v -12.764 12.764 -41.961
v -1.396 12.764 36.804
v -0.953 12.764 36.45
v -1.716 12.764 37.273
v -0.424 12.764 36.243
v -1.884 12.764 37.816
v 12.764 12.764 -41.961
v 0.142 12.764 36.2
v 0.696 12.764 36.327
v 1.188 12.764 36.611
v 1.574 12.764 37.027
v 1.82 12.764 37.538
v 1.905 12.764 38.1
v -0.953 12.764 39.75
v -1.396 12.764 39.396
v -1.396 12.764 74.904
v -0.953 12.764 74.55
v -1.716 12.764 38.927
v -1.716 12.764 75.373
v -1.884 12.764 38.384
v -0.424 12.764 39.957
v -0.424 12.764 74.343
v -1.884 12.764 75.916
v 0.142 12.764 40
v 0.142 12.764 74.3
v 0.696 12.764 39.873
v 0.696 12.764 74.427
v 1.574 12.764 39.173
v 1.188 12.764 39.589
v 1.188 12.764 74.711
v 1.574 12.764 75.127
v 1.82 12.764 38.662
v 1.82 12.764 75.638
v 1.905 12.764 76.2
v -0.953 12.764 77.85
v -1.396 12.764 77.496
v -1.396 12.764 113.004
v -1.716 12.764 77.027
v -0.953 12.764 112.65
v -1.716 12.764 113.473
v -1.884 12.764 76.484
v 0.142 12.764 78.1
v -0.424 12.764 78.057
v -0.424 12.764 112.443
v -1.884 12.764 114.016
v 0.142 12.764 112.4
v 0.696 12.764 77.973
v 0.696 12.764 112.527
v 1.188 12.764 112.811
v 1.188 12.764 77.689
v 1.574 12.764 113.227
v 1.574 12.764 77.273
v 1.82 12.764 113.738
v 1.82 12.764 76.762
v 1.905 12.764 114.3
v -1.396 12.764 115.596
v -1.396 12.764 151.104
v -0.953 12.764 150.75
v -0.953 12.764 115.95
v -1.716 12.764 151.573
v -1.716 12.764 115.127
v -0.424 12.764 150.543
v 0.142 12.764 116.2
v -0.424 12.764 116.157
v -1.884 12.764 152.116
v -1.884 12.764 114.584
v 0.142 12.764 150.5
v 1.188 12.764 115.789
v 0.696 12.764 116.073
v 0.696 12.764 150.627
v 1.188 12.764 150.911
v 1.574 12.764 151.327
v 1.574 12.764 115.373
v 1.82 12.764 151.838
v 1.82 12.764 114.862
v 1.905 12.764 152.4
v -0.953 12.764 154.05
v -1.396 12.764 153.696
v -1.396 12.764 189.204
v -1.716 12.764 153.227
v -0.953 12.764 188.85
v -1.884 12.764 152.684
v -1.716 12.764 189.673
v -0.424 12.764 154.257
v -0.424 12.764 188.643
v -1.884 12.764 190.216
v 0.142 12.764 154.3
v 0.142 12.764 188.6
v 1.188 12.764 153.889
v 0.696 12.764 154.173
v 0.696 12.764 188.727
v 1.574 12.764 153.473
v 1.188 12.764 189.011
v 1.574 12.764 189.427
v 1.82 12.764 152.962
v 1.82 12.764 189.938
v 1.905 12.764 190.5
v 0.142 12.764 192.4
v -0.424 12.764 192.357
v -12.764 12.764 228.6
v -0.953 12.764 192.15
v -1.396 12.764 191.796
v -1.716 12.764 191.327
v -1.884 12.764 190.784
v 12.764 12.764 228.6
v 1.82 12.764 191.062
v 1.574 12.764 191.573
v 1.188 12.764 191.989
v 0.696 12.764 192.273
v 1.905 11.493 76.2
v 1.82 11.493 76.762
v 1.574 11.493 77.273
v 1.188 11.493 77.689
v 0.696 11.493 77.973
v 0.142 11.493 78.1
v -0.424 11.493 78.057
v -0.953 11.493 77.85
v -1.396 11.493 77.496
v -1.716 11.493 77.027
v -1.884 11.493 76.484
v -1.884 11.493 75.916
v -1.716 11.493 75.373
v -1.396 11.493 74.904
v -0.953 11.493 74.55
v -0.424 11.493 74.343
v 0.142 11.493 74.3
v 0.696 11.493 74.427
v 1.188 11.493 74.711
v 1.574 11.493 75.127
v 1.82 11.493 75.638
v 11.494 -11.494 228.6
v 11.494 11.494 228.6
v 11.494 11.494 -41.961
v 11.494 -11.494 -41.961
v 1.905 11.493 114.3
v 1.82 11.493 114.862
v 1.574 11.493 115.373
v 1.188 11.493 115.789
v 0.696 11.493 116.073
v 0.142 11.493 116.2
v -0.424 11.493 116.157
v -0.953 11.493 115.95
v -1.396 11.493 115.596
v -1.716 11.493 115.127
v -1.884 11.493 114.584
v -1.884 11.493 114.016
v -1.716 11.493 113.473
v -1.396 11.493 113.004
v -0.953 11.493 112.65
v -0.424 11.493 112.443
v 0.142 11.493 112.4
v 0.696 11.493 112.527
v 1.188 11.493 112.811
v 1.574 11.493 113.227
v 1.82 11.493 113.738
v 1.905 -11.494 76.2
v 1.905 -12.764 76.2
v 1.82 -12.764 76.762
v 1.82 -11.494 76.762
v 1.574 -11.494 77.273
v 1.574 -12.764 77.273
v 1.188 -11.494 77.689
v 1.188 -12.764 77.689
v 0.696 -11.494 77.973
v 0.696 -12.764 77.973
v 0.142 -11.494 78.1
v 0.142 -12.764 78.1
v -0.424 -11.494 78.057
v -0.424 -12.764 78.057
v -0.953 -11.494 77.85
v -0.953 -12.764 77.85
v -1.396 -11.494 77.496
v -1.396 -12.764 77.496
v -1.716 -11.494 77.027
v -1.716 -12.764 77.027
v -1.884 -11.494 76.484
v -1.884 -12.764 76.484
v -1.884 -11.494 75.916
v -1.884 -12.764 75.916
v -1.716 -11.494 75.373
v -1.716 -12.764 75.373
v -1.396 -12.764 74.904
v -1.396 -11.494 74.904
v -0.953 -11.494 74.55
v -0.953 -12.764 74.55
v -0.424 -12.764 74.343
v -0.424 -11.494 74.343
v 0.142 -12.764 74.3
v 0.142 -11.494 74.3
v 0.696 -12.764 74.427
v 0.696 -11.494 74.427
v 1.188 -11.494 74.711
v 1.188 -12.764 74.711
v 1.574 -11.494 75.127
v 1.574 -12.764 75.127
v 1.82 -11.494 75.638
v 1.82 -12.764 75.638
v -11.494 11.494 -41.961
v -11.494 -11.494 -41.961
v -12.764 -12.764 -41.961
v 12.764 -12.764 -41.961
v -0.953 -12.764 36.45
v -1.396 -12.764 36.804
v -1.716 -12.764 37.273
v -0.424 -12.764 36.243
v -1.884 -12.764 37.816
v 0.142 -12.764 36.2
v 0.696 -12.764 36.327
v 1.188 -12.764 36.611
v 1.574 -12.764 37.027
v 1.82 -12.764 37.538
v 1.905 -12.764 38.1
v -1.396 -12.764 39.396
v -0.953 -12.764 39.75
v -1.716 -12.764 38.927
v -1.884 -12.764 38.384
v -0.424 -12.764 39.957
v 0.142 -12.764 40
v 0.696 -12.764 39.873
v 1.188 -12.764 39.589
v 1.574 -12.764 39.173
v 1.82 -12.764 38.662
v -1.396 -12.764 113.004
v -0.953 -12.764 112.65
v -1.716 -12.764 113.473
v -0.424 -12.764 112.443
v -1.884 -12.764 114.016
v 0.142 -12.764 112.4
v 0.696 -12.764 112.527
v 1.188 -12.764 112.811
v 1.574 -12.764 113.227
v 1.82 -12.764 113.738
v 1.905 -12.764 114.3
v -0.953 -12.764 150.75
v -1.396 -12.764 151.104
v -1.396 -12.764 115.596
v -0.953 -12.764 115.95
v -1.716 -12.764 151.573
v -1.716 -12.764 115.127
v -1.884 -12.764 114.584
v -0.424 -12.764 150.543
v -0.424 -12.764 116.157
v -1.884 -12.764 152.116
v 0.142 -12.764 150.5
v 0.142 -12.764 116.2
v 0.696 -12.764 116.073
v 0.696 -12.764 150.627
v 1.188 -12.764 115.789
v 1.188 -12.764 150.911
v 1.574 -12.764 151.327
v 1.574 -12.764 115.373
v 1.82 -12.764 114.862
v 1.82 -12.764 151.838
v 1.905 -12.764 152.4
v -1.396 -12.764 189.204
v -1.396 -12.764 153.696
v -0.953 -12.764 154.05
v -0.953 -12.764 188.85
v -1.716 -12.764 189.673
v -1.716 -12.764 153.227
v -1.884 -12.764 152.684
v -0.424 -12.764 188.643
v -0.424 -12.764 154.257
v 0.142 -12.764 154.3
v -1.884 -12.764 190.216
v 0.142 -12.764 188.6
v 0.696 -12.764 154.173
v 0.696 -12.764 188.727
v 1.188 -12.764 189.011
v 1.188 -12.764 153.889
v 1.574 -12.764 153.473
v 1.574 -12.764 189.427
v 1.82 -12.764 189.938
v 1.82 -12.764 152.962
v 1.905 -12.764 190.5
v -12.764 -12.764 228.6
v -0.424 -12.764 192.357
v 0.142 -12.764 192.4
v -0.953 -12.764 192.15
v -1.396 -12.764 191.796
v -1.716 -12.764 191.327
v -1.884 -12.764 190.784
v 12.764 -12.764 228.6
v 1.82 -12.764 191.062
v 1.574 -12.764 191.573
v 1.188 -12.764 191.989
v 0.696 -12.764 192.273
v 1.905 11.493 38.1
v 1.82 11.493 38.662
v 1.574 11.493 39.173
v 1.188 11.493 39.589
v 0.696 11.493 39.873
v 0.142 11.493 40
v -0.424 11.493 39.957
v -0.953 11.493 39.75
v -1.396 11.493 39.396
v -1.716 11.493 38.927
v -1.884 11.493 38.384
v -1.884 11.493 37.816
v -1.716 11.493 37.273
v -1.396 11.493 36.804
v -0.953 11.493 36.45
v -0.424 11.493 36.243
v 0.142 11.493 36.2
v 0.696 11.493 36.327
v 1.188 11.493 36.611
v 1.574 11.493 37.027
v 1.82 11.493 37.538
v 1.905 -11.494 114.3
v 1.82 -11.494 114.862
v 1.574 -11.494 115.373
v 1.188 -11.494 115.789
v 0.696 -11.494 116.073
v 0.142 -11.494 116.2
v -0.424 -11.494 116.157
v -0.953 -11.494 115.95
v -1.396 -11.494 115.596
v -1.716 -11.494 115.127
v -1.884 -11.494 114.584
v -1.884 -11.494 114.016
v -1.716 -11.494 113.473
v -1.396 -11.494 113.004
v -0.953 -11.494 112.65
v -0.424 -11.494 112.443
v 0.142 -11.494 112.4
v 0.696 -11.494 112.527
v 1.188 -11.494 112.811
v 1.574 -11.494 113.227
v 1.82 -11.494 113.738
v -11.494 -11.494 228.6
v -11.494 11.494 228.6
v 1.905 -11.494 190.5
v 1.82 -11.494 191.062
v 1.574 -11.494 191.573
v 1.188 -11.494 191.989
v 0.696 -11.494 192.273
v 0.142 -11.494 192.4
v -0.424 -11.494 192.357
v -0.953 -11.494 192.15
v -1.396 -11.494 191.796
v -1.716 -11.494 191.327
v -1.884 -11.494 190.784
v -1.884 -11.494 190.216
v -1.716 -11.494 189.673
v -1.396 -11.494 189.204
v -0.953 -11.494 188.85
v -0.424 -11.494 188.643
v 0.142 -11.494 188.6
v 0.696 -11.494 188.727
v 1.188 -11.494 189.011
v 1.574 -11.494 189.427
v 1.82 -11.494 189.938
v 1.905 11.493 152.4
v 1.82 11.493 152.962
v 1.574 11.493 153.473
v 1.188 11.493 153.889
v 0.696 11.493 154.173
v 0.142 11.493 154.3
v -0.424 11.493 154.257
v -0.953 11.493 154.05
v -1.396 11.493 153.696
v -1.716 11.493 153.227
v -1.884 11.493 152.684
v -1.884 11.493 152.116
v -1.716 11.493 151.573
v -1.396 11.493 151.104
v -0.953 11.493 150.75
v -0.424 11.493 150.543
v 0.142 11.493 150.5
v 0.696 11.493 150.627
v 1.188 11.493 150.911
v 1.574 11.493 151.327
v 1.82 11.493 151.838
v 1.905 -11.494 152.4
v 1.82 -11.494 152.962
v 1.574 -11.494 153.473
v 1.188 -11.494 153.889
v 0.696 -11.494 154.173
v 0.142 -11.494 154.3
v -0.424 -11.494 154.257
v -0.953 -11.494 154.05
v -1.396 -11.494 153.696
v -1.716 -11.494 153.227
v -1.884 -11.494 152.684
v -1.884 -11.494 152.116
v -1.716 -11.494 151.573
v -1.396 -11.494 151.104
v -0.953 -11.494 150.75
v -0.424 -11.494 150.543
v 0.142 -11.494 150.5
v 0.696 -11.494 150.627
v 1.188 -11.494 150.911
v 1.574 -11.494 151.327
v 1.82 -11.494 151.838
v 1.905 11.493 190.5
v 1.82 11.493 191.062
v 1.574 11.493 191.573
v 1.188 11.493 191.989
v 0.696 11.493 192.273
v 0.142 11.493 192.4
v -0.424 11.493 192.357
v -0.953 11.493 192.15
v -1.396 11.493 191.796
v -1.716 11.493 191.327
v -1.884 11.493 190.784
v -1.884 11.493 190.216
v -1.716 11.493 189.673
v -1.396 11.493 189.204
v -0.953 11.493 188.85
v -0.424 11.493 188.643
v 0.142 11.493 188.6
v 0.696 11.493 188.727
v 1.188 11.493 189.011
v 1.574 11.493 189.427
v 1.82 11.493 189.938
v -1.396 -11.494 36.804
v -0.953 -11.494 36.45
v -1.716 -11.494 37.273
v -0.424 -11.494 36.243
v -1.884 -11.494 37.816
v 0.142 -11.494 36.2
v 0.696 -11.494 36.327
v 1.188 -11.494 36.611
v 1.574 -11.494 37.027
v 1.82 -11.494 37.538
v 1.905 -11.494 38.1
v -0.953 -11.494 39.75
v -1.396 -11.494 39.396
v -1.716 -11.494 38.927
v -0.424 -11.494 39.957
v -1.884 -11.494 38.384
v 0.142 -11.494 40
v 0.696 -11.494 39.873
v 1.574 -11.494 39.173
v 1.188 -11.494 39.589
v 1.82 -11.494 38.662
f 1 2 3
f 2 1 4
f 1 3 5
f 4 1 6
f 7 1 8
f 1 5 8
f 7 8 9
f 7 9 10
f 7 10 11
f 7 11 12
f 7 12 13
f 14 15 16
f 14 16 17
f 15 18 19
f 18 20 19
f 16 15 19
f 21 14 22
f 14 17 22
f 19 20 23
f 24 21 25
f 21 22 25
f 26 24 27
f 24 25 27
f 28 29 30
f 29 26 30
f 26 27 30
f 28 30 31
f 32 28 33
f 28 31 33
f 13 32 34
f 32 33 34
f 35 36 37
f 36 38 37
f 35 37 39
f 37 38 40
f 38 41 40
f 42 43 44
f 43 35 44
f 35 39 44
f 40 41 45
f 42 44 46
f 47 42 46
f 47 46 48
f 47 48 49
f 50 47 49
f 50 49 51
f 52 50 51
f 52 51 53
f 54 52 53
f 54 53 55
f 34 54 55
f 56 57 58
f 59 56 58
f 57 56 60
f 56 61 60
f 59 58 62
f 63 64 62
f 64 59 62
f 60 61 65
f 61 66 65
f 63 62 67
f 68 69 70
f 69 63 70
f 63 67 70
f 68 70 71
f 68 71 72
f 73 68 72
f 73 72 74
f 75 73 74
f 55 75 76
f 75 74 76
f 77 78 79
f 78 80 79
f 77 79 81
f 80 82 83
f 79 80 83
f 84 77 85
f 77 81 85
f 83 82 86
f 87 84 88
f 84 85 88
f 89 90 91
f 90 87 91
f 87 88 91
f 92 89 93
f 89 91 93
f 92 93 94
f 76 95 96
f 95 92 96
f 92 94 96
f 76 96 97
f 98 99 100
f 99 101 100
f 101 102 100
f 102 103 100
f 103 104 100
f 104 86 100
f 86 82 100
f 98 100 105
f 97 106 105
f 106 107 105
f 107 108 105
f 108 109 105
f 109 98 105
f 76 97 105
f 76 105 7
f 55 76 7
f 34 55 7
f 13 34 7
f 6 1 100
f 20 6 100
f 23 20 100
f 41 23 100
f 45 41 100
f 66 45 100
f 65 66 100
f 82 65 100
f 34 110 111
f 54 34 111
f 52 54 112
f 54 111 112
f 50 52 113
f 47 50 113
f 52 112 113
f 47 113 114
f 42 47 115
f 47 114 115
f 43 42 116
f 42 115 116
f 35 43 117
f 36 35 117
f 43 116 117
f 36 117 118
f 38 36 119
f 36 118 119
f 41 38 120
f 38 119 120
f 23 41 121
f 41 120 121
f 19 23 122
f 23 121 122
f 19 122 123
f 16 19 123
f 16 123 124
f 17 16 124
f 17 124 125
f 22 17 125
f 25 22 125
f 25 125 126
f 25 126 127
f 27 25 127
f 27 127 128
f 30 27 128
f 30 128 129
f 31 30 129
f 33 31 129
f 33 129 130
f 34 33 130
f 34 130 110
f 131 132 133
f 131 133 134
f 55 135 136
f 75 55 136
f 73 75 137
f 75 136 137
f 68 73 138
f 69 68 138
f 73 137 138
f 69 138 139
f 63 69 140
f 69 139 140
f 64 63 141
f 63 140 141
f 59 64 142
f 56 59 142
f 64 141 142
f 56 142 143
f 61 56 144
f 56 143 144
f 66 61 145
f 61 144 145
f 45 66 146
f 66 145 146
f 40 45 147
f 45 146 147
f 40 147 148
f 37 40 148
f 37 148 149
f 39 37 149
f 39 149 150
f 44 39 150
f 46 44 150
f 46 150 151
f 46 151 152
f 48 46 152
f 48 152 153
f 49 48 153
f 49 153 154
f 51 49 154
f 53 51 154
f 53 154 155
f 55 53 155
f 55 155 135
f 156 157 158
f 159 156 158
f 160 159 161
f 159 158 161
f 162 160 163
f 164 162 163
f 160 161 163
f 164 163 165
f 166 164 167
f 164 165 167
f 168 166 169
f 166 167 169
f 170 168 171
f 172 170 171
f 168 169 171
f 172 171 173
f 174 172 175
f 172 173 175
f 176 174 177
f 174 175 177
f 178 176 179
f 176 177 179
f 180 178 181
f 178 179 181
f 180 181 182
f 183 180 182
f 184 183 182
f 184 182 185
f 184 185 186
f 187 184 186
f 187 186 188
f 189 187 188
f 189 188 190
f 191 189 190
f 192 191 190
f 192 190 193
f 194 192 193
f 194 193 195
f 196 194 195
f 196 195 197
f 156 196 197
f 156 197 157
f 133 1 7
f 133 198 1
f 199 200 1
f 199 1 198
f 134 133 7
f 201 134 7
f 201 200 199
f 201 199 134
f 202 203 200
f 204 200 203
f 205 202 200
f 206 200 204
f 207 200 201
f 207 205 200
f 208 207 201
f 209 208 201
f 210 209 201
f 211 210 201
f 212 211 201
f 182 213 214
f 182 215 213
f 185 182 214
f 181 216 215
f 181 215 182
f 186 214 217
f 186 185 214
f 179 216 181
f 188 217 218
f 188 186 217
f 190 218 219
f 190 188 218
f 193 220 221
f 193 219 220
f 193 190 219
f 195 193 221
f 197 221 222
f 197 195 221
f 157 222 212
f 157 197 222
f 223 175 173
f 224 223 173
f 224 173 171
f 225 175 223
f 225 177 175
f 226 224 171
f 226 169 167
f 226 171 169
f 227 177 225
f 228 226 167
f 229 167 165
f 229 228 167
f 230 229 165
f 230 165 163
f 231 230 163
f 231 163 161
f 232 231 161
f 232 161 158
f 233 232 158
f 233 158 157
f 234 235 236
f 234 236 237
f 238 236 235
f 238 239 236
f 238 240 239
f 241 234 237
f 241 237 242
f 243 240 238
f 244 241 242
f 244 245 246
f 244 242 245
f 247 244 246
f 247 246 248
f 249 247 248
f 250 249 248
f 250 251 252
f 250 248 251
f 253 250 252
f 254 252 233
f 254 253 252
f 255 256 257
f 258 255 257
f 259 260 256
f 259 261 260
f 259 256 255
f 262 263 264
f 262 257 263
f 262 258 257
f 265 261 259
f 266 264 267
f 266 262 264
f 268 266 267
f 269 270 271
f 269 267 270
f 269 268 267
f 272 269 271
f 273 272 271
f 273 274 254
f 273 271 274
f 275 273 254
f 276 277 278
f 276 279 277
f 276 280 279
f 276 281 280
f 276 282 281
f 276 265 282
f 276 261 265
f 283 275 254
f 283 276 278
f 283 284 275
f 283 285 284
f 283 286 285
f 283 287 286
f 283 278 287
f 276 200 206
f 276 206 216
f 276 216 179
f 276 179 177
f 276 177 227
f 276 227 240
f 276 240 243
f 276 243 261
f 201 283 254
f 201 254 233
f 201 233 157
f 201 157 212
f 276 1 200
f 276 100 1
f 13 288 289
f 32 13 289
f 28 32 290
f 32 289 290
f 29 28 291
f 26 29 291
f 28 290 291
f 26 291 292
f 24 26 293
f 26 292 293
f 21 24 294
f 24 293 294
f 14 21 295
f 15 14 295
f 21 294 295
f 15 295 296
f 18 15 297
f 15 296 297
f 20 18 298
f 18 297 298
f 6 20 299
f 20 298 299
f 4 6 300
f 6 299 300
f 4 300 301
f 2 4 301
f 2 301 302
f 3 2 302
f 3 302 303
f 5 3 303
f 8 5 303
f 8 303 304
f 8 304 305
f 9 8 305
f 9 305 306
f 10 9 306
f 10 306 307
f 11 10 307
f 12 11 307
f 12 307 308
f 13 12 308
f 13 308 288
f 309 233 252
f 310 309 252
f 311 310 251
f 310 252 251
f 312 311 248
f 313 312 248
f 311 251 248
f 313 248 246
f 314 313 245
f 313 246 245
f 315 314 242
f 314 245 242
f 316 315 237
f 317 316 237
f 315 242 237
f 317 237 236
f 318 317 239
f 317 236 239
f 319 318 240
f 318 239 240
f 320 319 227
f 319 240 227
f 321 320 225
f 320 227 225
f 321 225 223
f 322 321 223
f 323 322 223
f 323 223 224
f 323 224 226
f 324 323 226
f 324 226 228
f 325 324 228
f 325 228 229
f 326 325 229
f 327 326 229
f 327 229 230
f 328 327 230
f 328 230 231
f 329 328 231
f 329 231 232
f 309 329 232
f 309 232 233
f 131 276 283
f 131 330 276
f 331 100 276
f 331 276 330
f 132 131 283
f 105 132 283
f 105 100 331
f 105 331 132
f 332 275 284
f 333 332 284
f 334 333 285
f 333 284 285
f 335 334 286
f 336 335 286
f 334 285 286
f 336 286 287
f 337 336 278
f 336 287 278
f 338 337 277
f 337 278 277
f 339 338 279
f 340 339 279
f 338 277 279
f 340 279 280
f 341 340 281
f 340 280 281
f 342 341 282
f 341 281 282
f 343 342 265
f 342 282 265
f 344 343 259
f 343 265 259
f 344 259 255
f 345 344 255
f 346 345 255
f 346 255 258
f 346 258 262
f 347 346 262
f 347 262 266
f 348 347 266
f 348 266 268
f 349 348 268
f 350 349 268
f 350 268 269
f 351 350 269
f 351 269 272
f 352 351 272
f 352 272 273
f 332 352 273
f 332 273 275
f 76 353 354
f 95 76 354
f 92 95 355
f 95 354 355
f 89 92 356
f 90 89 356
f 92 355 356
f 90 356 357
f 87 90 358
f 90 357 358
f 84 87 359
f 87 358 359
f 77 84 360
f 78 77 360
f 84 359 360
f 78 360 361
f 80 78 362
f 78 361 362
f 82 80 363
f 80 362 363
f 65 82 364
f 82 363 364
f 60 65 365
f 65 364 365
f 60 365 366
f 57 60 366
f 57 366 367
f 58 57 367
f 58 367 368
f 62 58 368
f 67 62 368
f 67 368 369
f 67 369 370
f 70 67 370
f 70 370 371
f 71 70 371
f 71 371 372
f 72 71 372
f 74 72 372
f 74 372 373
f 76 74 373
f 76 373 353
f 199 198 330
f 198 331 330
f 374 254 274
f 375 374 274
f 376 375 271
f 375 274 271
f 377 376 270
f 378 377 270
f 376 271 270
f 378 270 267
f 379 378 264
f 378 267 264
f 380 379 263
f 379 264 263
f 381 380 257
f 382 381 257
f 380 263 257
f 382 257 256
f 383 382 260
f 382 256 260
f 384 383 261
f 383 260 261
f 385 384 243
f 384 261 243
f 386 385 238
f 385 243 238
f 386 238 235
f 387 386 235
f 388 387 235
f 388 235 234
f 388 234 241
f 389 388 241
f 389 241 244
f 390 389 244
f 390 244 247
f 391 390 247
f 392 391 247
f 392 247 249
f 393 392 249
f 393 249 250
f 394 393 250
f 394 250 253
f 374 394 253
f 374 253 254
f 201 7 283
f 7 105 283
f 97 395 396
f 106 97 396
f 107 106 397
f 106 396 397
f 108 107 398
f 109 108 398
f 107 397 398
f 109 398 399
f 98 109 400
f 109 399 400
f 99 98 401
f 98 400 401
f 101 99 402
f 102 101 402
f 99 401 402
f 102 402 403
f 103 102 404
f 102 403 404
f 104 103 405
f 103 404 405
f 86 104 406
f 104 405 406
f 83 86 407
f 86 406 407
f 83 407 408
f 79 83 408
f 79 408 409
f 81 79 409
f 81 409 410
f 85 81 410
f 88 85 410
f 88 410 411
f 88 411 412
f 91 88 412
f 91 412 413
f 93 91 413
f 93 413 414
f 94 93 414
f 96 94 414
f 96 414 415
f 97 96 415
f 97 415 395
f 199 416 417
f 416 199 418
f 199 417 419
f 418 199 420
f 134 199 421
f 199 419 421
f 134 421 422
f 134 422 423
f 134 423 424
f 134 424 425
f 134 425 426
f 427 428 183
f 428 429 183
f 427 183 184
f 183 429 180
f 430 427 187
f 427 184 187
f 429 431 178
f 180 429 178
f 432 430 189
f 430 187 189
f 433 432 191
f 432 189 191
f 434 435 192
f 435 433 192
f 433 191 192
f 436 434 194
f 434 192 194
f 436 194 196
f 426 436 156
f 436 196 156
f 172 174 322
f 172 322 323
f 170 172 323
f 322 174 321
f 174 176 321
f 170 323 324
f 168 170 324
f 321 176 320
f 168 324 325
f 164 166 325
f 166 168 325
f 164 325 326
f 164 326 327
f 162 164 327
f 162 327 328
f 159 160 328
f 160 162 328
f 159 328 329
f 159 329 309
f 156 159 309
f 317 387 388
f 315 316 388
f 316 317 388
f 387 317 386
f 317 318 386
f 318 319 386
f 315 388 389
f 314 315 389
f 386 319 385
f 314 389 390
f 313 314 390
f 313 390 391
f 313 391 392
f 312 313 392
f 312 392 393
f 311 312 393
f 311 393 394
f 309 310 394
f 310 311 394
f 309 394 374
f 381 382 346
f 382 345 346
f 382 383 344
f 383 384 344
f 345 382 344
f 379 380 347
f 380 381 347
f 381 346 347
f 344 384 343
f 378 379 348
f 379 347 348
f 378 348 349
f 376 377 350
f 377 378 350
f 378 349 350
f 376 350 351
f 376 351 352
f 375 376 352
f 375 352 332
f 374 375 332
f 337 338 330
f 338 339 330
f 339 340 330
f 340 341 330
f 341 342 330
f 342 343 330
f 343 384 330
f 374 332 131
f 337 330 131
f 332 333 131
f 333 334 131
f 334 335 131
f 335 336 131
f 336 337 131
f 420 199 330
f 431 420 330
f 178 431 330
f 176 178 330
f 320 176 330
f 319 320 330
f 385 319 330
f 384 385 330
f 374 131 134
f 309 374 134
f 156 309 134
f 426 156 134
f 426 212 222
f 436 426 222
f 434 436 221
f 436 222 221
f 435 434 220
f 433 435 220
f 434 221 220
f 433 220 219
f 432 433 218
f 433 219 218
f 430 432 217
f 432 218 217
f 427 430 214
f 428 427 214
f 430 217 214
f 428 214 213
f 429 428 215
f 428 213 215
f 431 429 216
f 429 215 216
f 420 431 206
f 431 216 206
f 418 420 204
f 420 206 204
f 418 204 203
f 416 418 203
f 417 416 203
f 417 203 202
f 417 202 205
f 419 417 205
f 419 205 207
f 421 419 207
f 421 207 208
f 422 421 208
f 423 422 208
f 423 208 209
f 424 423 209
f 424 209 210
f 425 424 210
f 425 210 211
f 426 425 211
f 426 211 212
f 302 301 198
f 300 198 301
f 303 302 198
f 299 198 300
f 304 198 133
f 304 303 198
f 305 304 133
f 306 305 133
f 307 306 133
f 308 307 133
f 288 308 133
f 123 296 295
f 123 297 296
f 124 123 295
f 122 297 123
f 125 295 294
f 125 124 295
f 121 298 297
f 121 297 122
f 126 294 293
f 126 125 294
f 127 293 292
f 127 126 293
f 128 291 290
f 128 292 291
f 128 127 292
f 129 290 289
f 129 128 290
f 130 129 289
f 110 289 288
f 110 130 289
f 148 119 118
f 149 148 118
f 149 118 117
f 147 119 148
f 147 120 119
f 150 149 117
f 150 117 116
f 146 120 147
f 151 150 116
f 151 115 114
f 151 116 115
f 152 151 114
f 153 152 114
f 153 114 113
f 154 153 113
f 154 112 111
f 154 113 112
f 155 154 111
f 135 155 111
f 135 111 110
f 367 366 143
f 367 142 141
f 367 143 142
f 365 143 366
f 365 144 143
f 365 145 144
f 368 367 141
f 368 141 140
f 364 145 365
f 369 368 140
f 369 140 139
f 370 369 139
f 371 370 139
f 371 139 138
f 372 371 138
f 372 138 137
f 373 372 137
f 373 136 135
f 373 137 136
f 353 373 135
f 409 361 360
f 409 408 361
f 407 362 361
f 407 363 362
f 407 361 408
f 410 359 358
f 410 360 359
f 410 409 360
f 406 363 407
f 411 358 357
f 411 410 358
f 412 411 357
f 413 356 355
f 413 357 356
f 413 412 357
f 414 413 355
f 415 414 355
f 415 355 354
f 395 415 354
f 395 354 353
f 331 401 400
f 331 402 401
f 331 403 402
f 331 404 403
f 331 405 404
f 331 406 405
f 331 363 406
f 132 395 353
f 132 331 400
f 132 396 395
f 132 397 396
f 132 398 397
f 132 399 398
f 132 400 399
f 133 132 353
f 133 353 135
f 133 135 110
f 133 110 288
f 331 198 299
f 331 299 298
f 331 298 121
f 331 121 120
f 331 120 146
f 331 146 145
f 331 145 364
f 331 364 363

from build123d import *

# Parameters (mm, degrees)
F0_W     = 25.527
F0_H     = 25.527
F0_W_2   = 22.987
F0_H_2   = 22.987
F1_DEPTH = 228.6
F2_R     = 1.905
F3_DEPTH = 25.528
F4_W     = 25.527
F4_H     = 25.527
F4_W_2   = 22.987
F4_H_2   = 22.987
F5_DEPTH = 41.9608


with BuildPart() as f1:
    # F0 (on Top) → F1 (new body)
    with BuildSketch(Plane.XY):
        Rectangle(F0_W, F0_H)
        Rectangle(F0_W_2, F0_H_2, mode=Mode.SUBTRACT)
    extrude(amount=F1_DEPTH)

    # F2 (on face) → F3 (cut, through all)
    with BuildSketch(Plane.XZ.offset(12.7635)):
        with Locations((0, 38.1)):
            Circle(F2_R)
        with Locations((0, 76.2)):
            Circle(F2_R)
        with Locations((0, 114.3)):
            Circle(F2_R)
        with Locations((0, 152.4)):
            Circle(F2_R)
        with Locations((0, 190.5)):
            Circle(F2_R)
    extrude(amount=-F3_DEPTH, mode=Mode.SUBTRACT)

    # F4 (on face) → F5 (join)
    with BuildSketch(Plane(origin=(0, 0, 0), x_dir=(1, 0, 0), z_dir=(0, 0, -1))):
        Rectangle(F4_W, F4_H)
        Rectangle(F4_W_2, F4_H_2, mode=Mode.SUBTRACT)
    extrude(amount=F5_DEPTH)


solid = f1.part
